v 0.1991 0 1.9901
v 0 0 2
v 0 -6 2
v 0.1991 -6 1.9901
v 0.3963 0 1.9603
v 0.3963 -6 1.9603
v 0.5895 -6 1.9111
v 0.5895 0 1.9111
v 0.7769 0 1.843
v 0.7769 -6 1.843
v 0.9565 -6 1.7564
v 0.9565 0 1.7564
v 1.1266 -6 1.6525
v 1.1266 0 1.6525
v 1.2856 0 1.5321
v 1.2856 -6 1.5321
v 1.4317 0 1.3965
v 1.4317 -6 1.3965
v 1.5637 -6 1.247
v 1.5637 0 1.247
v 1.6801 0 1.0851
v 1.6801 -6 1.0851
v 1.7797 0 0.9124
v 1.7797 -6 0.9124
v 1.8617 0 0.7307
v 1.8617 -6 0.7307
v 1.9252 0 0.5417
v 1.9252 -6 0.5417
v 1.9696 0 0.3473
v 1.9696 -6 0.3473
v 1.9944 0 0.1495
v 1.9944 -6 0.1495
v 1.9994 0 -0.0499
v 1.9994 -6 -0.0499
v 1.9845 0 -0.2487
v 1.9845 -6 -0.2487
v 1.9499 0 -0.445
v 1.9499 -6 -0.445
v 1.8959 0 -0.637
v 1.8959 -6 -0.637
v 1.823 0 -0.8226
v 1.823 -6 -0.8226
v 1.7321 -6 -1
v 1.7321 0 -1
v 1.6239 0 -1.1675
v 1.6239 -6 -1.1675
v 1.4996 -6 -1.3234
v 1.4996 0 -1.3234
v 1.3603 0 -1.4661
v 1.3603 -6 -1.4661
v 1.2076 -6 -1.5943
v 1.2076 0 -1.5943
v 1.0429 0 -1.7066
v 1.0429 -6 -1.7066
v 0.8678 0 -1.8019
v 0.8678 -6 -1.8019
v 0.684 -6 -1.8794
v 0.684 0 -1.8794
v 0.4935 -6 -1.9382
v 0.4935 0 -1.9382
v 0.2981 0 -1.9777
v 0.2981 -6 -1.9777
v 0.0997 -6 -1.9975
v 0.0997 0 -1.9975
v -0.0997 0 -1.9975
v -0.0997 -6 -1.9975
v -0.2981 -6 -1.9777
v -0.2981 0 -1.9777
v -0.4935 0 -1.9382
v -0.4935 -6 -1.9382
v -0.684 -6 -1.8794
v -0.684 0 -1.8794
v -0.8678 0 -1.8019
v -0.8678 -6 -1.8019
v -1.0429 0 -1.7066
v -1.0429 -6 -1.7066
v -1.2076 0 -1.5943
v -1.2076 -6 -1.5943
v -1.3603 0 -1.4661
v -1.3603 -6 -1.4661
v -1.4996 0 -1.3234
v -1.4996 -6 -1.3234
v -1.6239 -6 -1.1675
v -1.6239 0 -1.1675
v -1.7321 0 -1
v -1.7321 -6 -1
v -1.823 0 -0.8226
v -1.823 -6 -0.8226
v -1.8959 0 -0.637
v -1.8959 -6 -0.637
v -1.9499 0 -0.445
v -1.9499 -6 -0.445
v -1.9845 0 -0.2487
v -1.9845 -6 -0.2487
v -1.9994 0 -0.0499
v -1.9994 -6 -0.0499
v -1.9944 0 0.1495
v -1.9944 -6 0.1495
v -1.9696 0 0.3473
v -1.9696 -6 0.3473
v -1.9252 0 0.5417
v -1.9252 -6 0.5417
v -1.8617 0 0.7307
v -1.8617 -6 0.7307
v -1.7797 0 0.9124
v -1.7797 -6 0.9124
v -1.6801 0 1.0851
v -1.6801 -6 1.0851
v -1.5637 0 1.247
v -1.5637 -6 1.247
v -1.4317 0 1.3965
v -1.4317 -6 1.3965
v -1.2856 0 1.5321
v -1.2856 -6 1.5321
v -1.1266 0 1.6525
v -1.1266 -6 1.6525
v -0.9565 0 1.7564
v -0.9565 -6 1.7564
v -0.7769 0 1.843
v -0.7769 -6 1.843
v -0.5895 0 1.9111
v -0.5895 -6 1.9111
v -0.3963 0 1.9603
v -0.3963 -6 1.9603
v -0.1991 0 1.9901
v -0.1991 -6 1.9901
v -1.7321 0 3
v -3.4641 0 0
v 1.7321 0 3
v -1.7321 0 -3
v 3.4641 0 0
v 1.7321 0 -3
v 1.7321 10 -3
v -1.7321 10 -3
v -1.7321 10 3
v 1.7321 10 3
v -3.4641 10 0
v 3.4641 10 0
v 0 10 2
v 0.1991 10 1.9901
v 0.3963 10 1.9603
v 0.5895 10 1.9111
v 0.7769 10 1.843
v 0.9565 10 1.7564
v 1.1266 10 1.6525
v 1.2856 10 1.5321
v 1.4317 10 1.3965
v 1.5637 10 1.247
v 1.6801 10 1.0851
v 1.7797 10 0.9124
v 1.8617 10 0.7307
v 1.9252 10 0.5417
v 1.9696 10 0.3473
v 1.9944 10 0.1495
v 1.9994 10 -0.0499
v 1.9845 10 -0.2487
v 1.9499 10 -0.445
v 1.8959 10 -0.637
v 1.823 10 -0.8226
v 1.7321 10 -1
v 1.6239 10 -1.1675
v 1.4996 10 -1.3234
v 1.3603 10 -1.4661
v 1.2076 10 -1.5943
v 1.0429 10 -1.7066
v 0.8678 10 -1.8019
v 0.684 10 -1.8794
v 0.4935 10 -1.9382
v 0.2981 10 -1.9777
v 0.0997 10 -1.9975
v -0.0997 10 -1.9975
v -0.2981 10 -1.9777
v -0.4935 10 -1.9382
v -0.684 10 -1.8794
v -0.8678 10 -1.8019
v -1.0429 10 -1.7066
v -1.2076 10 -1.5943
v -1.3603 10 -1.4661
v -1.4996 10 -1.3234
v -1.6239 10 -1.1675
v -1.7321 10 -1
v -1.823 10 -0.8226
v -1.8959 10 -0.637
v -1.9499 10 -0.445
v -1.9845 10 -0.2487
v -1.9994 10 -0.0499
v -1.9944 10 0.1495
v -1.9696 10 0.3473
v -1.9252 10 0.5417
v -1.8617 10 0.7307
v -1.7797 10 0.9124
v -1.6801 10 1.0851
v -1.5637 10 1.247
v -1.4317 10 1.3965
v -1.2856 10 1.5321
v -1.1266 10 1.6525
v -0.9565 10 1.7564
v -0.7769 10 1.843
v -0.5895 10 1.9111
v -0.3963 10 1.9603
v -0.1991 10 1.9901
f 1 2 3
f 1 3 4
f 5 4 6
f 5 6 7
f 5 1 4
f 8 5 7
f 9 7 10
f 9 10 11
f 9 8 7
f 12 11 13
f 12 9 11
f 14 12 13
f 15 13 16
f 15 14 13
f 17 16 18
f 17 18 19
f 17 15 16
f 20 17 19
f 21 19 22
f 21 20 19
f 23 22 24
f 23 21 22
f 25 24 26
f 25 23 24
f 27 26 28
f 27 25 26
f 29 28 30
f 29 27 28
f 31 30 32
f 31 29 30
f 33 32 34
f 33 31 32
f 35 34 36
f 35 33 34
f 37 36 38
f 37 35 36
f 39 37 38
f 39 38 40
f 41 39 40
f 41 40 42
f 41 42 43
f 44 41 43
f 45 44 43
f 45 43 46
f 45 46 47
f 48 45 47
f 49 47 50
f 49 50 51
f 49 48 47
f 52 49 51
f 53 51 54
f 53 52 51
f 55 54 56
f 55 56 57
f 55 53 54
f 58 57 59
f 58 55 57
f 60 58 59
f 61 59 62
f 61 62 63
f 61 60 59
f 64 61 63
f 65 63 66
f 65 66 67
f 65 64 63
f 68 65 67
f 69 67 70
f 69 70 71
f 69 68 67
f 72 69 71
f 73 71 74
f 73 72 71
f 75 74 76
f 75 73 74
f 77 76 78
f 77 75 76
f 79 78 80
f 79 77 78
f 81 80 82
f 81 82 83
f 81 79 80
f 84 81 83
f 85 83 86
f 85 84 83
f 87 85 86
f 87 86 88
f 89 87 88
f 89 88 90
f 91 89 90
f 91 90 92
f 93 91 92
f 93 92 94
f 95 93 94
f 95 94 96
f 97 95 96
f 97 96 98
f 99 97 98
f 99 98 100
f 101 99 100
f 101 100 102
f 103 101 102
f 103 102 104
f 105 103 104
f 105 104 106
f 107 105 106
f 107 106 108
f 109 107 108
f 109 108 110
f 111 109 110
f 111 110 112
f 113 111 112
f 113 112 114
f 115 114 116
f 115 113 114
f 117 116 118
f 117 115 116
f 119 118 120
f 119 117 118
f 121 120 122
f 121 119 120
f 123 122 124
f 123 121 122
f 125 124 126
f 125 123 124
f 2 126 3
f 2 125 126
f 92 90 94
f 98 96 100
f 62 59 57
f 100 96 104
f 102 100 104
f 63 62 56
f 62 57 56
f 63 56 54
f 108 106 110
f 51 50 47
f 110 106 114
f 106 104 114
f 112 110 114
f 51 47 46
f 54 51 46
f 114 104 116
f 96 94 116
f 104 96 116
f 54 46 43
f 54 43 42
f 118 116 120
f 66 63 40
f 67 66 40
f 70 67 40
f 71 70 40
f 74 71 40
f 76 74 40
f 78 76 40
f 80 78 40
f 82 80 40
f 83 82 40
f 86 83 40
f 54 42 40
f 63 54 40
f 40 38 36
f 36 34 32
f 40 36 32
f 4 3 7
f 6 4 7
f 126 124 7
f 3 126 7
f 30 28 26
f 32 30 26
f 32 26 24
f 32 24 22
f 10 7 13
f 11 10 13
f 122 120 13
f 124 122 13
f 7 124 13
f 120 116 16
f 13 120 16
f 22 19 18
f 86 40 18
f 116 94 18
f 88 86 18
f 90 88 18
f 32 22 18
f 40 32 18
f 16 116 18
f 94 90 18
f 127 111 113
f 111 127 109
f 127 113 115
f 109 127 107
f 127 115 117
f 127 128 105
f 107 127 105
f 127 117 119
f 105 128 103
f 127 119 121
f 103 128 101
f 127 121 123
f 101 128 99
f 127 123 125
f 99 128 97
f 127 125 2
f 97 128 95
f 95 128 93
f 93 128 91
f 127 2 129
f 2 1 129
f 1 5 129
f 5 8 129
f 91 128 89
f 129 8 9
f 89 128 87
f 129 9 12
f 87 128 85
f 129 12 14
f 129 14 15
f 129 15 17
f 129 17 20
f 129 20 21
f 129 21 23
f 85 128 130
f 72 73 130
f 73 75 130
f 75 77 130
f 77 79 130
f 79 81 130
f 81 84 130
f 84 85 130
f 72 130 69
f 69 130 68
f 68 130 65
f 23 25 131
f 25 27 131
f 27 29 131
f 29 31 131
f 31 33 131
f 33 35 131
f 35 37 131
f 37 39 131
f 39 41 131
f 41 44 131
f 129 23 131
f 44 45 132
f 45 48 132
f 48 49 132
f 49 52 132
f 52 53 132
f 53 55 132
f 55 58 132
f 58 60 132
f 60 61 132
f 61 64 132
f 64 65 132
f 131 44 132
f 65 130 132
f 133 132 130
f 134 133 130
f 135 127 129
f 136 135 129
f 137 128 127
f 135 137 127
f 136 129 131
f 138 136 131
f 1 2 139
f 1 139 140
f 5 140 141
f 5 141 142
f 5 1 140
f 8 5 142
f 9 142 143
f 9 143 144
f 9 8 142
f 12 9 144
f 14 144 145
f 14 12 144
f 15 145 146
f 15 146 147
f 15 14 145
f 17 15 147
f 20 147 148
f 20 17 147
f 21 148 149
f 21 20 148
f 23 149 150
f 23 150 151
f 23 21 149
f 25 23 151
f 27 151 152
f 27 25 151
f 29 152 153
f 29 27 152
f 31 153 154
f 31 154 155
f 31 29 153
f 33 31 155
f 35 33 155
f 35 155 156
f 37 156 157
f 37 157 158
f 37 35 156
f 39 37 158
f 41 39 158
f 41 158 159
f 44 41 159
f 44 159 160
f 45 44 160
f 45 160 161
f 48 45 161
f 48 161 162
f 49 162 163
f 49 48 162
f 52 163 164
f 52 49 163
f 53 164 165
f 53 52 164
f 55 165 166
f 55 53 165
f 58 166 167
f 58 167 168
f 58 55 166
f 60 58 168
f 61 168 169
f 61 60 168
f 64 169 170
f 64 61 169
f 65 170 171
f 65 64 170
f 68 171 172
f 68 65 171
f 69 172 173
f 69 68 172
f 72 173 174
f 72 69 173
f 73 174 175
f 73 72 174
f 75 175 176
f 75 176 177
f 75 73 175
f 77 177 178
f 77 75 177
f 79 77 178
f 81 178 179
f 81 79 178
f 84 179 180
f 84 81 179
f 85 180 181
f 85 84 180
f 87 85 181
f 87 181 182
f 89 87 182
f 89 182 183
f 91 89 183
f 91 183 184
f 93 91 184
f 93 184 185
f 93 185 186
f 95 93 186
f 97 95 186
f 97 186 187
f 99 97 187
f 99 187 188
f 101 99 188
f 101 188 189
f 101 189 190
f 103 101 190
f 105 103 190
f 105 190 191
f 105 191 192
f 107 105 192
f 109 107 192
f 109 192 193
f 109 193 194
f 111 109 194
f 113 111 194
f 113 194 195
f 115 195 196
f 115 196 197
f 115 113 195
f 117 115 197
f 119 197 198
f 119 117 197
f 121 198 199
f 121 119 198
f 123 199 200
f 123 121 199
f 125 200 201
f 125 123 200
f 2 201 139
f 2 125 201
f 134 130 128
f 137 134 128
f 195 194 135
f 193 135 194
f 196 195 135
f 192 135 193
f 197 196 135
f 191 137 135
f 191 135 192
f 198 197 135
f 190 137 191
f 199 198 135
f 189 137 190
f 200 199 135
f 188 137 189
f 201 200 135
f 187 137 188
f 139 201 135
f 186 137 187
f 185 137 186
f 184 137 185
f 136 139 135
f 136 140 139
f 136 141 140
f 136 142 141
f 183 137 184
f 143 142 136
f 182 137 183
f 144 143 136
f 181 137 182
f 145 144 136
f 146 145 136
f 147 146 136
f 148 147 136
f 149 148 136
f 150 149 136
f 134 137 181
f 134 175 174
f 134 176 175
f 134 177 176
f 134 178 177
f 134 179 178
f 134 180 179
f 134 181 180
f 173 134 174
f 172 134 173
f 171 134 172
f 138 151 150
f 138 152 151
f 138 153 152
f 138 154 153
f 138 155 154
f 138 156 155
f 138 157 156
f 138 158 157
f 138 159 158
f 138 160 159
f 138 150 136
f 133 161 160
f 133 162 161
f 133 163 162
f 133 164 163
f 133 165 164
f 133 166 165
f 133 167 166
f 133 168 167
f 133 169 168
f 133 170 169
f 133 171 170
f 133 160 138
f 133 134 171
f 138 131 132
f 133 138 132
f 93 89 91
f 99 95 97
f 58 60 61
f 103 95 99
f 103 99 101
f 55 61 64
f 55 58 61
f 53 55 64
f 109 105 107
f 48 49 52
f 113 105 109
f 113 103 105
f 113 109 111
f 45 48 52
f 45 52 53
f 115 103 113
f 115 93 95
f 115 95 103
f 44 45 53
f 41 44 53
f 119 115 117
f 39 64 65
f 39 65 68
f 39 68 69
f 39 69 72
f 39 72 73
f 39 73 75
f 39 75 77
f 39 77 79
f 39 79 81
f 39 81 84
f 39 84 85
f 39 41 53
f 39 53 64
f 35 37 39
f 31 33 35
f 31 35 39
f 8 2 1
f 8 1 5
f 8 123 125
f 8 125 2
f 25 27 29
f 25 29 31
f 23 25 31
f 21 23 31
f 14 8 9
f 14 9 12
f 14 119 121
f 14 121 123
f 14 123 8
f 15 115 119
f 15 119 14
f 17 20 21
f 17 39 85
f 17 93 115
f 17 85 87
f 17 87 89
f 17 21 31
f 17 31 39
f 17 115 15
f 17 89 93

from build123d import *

# Parameters (mm, degrees)
SKETCH_2_R      = 2
EXTRUDE_1_DEPTH = 10
SKETCH_2_2_R    = 2
EXTRUDE_2_DEPTH = 6


with BuildPart() as part:
    # 草图2 → 凸台-拉伸1 (new body)
    with BuildSketch(Plane(origin=(0, 0, 0), x_dir=(1, 0, 0), z_dir=(0, 1, 0))):
        Polygon((3.464101615, 0), (1.732050808, 3), (-1.732050808, 3), (-3.464101615, 0), (-1.732050808, -3), (1.732050808, -3), align=None)
        Circle(SKETCH_2_R, mode=Mode.SUBTRACT)
    extrude(amount=EXTRUDE_1_DEPTH)


with BuildPart() as body_2:
    # 草图2<2> → 凸台-拉伸2 (new body)
    with BuildSketch(Plane(origin=(0, 0, 0), x_dir=(1, 0, 0), z_dir=(0, 1, 0))):
        Circle(SKETCH_2_2_R)
    extrude(amount=-EXTRUDE_2_DEPTH)


solid = Compound([part.part, body_2.part])
